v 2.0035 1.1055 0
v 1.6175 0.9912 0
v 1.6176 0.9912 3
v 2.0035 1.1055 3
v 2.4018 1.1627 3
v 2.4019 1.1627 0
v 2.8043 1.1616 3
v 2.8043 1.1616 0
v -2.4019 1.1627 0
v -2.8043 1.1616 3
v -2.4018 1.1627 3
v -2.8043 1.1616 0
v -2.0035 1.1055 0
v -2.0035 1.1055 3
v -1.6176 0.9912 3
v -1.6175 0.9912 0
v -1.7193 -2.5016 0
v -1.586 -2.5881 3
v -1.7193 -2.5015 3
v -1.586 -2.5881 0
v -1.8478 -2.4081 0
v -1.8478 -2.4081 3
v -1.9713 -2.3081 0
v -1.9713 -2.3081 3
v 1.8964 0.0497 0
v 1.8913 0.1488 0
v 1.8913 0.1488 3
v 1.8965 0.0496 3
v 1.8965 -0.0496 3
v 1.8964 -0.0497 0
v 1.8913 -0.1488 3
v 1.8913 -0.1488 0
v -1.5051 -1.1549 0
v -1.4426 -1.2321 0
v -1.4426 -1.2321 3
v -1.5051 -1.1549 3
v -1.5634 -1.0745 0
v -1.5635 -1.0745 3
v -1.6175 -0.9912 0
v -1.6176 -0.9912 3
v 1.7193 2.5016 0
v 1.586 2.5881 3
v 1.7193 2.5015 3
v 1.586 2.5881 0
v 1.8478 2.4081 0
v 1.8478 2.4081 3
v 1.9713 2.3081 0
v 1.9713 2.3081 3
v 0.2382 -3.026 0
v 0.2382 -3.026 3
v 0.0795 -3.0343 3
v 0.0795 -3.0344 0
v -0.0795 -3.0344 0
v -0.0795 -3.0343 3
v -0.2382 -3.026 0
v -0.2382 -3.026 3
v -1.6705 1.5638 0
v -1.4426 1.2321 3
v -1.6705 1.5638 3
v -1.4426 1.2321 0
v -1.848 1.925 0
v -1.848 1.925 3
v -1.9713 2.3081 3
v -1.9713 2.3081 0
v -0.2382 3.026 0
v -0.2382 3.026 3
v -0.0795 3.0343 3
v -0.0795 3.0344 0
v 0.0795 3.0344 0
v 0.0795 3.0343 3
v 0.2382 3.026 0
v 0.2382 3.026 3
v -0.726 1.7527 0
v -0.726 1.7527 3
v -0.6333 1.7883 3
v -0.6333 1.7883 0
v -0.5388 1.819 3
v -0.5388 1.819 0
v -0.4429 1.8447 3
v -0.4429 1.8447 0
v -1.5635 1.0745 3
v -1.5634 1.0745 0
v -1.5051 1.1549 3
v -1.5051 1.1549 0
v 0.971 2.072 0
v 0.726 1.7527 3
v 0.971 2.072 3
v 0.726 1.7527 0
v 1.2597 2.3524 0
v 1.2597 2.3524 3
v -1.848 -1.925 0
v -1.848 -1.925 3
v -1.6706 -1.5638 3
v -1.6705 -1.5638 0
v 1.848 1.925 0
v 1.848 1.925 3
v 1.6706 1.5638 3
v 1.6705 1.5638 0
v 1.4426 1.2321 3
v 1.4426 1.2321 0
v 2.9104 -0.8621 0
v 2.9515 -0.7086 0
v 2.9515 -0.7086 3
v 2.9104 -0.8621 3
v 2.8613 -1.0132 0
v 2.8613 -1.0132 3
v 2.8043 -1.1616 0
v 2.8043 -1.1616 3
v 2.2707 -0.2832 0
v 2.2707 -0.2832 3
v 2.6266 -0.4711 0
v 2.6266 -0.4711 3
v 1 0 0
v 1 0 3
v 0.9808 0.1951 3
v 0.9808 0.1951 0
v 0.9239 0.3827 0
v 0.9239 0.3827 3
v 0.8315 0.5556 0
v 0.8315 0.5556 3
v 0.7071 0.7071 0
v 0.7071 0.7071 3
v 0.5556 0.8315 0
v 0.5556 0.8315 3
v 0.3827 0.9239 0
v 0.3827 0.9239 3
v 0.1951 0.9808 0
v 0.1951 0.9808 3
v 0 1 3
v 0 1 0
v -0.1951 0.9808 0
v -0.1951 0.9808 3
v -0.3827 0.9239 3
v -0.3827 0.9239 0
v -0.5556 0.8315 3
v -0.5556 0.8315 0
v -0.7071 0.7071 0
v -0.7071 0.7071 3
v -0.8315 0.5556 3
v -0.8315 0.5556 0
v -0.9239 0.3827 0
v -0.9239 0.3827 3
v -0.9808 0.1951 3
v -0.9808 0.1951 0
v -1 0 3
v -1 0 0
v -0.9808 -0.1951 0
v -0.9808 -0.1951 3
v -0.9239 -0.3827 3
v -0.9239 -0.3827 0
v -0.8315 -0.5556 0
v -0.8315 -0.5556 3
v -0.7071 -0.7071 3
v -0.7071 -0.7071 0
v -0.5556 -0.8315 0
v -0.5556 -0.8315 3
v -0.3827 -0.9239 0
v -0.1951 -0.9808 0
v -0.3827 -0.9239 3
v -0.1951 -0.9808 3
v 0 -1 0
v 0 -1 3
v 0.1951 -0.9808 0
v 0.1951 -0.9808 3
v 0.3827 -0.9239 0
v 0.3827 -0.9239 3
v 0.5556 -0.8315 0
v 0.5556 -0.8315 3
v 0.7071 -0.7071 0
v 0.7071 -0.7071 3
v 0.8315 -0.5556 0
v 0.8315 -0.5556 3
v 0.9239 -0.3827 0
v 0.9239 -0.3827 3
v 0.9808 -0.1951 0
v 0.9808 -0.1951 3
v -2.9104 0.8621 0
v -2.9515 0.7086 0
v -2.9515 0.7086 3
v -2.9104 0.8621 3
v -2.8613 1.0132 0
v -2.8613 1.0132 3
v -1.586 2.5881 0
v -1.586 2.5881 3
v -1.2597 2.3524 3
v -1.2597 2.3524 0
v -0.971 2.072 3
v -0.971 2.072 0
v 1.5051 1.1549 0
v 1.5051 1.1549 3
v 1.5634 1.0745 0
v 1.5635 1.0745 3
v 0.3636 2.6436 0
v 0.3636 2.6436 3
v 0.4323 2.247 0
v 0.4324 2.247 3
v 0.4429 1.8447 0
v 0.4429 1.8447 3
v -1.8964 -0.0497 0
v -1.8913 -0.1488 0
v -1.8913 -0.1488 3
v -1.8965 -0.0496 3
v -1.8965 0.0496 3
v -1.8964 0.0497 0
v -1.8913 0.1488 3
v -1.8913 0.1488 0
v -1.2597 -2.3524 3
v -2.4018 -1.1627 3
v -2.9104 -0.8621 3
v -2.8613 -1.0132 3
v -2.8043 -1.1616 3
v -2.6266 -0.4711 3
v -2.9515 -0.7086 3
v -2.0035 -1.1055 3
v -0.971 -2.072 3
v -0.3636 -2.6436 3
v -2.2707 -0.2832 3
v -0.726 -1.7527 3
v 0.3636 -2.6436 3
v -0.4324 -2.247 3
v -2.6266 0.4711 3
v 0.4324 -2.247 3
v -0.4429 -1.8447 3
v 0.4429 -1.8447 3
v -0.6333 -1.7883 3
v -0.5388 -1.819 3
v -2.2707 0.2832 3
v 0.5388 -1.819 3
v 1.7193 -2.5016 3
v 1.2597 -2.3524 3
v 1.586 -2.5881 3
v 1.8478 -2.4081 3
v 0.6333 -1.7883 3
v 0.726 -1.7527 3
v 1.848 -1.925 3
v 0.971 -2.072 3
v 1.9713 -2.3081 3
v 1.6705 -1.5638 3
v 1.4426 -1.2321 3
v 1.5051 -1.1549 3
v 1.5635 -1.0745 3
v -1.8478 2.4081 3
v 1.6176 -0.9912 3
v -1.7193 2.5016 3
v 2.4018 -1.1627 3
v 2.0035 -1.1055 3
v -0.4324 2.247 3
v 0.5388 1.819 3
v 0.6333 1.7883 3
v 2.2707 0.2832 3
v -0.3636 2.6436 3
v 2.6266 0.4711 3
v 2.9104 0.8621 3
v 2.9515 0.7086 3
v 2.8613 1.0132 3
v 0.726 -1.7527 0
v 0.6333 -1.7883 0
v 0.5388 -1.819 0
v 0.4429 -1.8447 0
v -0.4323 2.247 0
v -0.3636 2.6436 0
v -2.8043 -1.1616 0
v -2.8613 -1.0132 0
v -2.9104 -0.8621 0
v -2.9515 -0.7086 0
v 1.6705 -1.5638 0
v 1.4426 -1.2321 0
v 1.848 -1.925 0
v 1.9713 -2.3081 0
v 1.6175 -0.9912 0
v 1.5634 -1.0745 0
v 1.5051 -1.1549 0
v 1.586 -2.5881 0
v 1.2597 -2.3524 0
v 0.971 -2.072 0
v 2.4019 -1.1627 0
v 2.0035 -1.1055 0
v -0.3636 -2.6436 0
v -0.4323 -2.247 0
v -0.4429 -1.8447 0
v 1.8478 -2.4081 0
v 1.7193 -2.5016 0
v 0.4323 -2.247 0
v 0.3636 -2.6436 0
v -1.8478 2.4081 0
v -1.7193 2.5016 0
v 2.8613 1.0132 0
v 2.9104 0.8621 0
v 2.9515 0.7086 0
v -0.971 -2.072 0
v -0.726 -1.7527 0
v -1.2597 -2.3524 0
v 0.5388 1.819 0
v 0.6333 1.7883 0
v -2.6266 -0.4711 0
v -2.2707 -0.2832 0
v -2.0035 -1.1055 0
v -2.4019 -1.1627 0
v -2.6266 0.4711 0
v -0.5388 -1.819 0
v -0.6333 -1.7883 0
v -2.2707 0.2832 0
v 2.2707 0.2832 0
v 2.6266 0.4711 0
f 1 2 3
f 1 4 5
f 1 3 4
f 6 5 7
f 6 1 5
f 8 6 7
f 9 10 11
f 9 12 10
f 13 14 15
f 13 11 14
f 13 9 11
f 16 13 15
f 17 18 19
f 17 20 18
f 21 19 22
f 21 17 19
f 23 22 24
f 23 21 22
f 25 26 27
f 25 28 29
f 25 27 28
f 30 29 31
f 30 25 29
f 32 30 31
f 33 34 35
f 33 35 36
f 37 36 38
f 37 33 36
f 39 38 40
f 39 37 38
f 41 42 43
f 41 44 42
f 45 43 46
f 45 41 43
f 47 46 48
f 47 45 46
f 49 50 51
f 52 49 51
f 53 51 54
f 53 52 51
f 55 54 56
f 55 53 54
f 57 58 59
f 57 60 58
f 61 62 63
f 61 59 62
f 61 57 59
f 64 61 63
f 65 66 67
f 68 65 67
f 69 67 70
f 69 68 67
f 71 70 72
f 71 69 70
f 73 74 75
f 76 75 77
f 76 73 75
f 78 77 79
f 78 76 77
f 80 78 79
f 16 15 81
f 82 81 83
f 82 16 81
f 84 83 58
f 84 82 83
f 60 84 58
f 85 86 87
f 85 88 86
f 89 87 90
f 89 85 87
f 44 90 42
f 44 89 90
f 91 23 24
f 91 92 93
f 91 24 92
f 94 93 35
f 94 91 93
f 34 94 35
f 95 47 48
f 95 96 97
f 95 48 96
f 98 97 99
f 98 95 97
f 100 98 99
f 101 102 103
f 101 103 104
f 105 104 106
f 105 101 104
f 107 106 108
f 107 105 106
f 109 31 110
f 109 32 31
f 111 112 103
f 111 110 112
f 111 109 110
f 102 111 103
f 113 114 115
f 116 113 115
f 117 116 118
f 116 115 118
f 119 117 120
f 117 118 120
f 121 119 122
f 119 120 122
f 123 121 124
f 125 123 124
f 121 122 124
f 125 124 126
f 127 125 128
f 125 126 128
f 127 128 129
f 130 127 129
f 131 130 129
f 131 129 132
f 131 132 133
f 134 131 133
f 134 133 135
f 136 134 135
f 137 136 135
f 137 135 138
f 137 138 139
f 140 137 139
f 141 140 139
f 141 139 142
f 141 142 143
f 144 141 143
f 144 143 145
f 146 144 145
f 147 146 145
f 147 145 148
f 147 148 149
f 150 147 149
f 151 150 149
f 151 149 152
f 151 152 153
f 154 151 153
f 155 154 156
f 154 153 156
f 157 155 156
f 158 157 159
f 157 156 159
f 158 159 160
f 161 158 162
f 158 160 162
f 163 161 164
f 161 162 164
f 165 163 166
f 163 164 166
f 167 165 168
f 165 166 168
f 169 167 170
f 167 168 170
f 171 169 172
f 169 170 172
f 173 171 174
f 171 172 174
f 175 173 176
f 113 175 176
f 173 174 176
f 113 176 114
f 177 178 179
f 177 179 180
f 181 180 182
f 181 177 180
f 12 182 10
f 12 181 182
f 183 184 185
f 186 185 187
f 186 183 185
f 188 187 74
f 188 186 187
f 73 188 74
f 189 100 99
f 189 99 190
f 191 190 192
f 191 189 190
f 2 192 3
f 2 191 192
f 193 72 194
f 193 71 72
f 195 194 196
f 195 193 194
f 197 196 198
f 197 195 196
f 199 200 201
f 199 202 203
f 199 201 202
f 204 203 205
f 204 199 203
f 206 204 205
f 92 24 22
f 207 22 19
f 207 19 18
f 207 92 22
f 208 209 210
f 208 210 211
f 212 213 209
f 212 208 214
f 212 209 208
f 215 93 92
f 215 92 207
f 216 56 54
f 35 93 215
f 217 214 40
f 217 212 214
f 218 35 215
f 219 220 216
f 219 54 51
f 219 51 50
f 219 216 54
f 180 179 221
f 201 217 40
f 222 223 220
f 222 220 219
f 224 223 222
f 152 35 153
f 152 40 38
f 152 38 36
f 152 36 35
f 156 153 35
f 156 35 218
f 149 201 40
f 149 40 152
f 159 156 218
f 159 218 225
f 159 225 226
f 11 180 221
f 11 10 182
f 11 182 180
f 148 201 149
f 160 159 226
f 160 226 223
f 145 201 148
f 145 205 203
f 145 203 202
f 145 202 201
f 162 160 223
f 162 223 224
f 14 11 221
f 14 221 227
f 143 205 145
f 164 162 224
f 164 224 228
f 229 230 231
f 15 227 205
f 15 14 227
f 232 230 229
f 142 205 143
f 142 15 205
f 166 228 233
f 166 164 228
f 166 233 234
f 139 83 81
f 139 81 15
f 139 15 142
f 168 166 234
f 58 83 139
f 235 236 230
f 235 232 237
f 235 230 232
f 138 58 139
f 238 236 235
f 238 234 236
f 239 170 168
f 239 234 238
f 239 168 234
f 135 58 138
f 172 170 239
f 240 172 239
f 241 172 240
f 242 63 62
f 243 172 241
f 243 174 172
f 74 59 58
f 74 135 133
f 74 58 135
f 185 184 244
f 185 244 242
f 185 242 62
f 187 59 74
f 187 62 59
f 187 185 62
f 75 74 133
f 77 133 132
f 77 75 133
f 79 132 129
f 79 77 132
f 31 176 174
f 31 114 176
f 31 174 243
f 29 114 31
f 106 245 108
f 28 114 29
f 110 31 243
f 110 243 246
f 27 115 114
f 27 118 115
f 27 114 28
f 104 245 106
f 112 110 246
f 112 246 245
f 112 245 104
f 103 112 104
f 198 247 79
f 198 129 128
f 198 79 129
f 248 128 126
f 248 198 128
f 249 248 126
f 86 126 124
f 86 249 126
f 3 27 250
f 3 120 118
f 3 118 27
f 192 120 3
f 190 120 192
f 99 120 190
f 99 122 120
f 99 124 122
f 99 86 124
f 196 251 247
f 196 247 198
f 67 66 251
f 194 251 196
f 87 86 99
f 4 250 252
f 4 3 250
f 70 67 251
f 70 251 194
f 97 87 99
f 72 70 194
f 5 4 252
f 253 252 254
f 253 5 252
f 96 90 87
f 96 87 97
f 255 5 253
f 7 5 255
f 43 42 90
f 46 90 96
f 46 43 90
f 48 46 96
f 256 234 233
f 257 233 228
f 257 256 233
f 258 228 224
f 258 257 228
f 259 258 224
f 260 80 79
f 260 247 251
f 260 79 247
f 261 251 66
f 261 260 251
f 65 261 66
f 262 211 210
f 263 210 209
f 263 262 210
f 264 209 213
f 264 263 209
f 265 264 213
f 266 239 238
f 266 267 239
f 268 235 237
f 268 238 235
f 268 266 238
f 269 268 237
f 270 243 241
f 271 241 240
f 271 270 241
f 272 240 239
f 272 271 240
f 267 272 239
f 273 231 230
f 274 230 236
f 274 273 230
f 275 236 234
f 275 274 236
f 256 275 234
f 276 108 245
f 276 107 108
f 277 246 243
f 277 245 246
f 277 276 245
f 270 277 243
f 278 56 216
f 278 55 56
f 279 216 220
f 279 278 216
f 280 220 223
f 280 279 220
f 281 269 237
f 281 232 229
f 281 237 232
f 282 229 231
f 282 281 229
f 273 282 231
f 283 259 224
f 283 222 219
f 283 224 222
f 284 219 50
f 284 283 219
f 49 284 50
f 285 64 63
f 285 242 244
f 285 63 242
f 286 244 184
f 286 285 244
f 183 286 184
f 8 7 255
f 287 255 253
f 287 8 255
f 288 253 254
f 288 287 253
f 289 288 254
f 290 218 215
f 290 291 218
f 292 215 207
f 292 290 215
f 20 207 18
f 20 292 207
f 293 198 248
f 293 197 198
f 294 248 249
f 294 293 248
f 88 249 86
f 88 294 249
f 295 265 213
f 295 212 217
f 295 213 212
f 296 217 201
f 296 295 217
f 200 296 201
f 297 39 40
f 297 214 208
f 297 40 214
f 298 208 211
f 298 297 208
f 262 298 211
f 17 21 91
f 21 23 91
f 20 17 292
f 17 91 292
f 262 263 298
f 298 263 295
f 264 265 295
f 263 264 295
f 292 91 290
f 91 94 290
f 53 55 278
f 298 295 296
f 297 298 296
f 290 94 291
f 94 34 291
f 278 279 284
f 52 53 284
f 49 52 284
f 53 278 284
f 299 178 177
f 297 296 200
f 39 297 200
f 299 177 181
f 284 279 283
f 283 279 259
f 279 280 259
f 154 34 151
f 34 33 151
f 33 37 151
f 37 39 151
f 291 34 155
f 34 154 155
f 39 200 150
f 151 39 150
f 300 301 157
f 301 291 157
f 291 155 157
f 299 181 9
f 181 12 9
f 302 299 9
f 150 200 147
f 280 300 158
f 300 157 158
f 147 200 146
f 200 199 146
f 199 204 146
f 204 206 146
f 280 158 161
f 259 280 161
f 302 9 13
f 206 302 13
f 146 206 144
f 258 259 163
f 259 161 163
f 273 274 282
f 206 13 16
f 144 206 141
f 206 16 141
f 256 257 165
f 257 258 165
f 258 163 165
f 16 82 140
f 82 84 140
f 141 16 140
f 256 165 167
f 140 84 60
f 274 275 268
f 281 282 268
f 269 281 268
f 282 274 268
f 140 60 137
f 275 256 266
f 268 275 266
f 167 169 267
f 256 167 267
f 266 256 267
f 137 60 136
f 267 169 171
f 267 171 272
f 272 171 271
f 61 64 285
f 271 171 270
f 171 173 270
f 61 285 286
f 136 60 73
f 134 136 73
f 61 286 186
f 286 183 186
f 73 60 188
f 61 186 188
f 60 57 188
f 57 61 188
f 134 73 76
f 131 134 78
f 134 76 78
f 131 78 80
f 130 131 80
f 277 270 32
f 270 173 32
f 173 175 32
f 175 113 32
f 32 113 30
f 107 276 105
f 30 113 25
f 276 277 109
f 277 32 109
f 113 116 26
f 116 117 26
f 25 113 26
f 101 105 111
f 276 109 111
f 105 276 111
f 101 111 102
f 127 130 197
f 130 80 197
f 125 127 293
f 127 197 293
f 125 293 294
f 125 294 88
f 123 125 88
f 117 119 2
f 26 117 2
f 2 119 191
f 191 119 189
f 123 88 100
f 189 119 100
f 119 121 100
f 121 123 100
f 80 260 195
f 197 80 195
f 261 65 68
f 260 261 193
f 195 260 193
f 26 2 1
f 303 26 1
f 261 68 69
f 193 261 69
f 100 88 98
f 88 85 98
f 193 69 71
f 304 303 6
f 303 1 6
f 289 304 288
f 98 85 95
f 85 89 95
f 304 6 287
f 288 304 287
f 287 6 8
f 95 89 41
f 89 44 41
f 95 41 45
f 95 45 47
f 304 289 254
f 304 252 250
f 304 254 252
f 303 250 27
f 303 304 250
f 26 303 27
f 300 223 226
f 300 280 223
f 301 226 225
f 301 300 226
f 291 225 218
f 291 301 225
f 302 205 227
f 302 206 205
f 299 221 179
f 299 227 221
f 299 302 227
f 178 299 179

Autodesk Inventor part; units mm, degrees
sketch "Sketch1" plane through (0, 0, 0) normal (0, 0, 1) x (1, 0, 0)
  circle A0 centre (0, 0) radius 3.0354
  dimension "d0" = 6.0708
extrude "Extrusion1" add sketch "Sketch1" along normal blind 20
ref_plane "Work Plane2" through (0, 0, 10) normal (0, 0, 1) x (1, 0, 0)
sketch "Sketch2" plane through (0, 0, 0) normal (0, 0, -1) x (-1, 0, 0)
  circle A0 centre (0, 0) radius 3.0354 projected
  circle A1 centre (0, 0) radius 2.5295
  dimension "d3" = 5.059
surface extrude "Pitch Diameter" sketch "Sketch2" against normal through all shown no curves A1
ref_plane "Work Plane8" through (0, 0, 0) normal (0.9510565, 0.309017, 0) x (0, 0, 1)
ref_plane "Work Plane9" through (0, 0, 0) normal (1, 0, 0) x (0, 1, 0)
spur gear teeth "Spur Gear" teeth 10 pitch diameter 5.059 tip diameter 6.0708 root diameter 3.7942 face width 20 start plane through (0, 0, 0) normal (0, 0, -1) x (-1, 0, 0)
sketch "Sketch3" plane through (0, 0, 20) normal (0, 0, 1) x (1, 0, 0)
  arc A0 (-1.9713, 2.3081) -> (-1.4426, 1.2321) centre (0.7208, 2.9631) ccw projected
  arc A1 (-1.4426, 1.2321) -> (-1.6176, 0.9912) centre (0, 0) ccw projected
  arc A2 (-1.6176, 0.9912) -> (-2.8043, 1.1616) centre (-2.5953, -1.6011) ccw projected
  arc A3 (-2.8043, 1.1616) -> (-2.9515, 0.7086) centre (0, 0) ccw projected
  arc A4 (-2.9515, 0.7086) -> (-1.8913, 0.1488) centre (-1.1585, 2.8208) ccw projected
  arc A5 (-1.8913, 0.1488) -> (-1.8913, -0.1488) centre (0, 0) ccw projected
  arc A6 (-1.8913, -0.1488) -> (-2.9515, -0.7086) centre (-1.1585, -2.8208) ccw projected
  arc A7 (-2.9515, -0.7086) -> (-2.8043, -1.1616) centre (0, 0) ccw projected
  arc A8 (-2.8043, -1.1616) -> (-1.6176, -0.9912) centre (-2.5953, 1.6011) ccw projected
  arc A9 (-1.6176, -0.9912) -> (-1.4426, -1.2321) centre (0, 0) ccw projected
  arc A10 (-1.4426, -1.2321) -> (-1.9713, -2.3081) centre (0.7208, -2.9631) ccw projected
  arc A11 (-1.9713, -2.3081) -> (-1.586, -2.5881) centre (0, 0) ccw projected
  arc A12 (-1.586, -2.5881) -> (-0.726, -1.7527) centre (-3.0408, -0.2301) ccw projected
  arc A13 (-0.726, -1.7527) -> (-0.4429, -1.8447) centre (0, 0) ccw projected
  arc A14 (-0.4429, -1.8447) -> (-0.2382, -3.026) centre (2.3248, -1.9735) ccw projected
  arc A15 (-0.2382, -3.026) -> (0.2382, -3.026) centre (0, 0) ccw projected
  arc A16 (0.2382, -3.026) -> (0.4429, -1.8447) centre (-2.3248, -1.9735) ccw projected
  arc A17 (0.4429, -1.8447) -> (0.726, -1.7527) centre (0, 0) ccw projected
  arc A18 (0.726, -1.7527) -> (1.586, -2.5881) centre (3.0408, -0.2301) ccw projected
  arc A19 (1.586, -2.5881) -> (1.9713, -2.3081) centre (0, 0) ccw projected
  arc A20 (1.9713, -2.3081) -> (1.4426, -1.2321) centre (-0.7208, -2.9631) ccw projected
  arc A21 (1.4426, -1.2321) -> (1.6176, -0.9912) centre (0, 0) ccw projected
  arc A22 (1.6176, -0.9912) -> (2.8043, -1.1616) centre (2.5953, 1.6011) ccw projected
  arc A23 (2.8043, -1.1616) -> (2.9515, -0.7086) centre (0, 0) ccw projected
  arc A24 (2.9515, -0.7086) -> (1.8913, -0.1488) centre (1.1585, -2.8208) ccw projected
  arc A25 (1.8913, -0.1488) -> (1.8913, 0.1488) centre (0, 0) ccw projected
  arc A26 (1.8913, 0.1488) -> (2.9515, 0.7086) centre (1.1585, 2.8208) ccw projected
  arc A27 (2.9515, 0.7086) -> (2.8043, 1.1616) centre (0, 0) ccw projected
  arc A28 (2.8043, 1.1616) -> (1.6176, 0.9912) centre (2.5953, -1.6011) ccw projected
  arc A29 (1.6176, 0.9912) -> (1.4426, 1.2321) centre (0, 0) ccw projected
  arc A30 (1.4426, 1.2321) -> (1.9713, 2.3081) centre (-0.7208, 2.9631) ccw projected
  arc A31 (1.9713, 2.3081) -> (1.586, 2.5881) centre (0, 0) ccw projected
  arc A32 (1.586, 2.5881) -> (0.726, 1.7527) centre (3.0408, 0.2301) ccw projected
  arc A33 (0.726, 1.7527) -> (0.4429, 1.8447) centre (0, 0) ccw projected
  arc A34 (0.4429, 1.8447) -> (0.2382, 3.026) centre (-2.3248, 1.9735) ccw projected
  arc A35 (0.2382, 3.026) -> (-0.2382, 3.026) centre (0, 0) ccw projected
  arc A36 (-0.2382, 3.026) -> (-0.4429, 1.8447) centre (2.3248, 1.9735) ccw projected
  arc A37 (-0.4429, 1.8447) -> (-0.726, 1.7527) centre (0, 0) ccw projected
  arc A38 (-0.726, 1.7527) -> (-1.586, 2.5881) centre (-3.0408, 0.2301) ccw projected
  arc A39 (-1.586, 2.5881) -> (-1.9713, 2.3081) centre (0, 0) ccw projected
  circle A40 centre (0, 0) radius 1
  dimension "d49" = 2
ref_plane "Work Plane11" through (-4.7906, 1.2372, 4) normal (0, 0, 1) x (0.9749279, -0.2225209, 0)
extrude "Extrusion2" cut sketch "Sketch3" against normal up to surface (16 mm away) contours A39 A38 A37 A36 A35 A34 A33 A32 A31 A30 A29 A28 A27 A26 A25 A24 A23 A22 A21 A20 A19 A18 A17 A16 A15 A14 A13 A12 A11 A10 A9 A8 A7 A6 A5 A4 A3 A2 A1 A0 | A40
extrude "Extrusion3" cut sketch "Sketch3" against normal through all contours A40
sketch "Sketch4" plane through (0, 0, 4) normal (0, 0, 1) x (1, 0, 0)
  circle A0 centre (0, 0) radius 1 projected
  arc A1 (-1.6176, 0.9912) -> (-2.8043, 1.1616) centre (-2.5953, -1.6011) ccw projected
  arc A2 (-2.8043, 1.1616) -> (-2.9515, 0.7086) centre (0, 0) ccw projected
  arc A3 (-2.9515, 0.7086) -> (-1.8913, 0.1488) centre (-1.1585, 2.8208) ccw projected
  arc A4 (-1.8913, 0.1488) -> (-1.8913, -0.1488) centre (0, 0) ccw projected
  arc A5 (-1.8913, -0.1488) -> (-2.9515, -0.7086) centre (-1.1585, -2.8208) ccw projected
  arc A6 (-2.9515, -0.7086) -> (-2.8043, -1.1616) centre (0, 0) ccw projected
  arc A7 (-2.8043, -1.1616) -> (-1.6176, -0.9912) centre (-2.5953, 1.6011) ccw projected
  arc A8 (-1.6176, -0.9912) -> (-1.4426, -1.2321) centre (0, 0) ccw projected
  arc A9 (-1.4426, -1.2321) -> (-1.9713, -2.3081) centre (0.7208, -2.9631) ccw projected
  arc A10 (-1.9713, -2.3081) -> (-1.586, -2.5881) centre (0, 0) ccw projected
  arc A11 (-1.586, -2.5881) -> (-0.726, -1.7527) centre (-3.0408, -0.2301) ccw projected
  arc A12 (-0.726, -1.7527) -> (-0.4429, -1.8447) centre (0, 0) ccw projected
  arc A13 (-0.4429, -1.8447) -> (-0.2382, -3.026) centre (2.3248, -1.9735) ccw projected
  arc A14 (-0.2382, -3.026) -> (0.2382, -3.026) centre (0, 0) ccw projected
  arc A15 (0.2382, -3.026) -> (0.4429, -1.8447) centre (-2.3248, -1.9735) ccw projected
  arc A16 (0.4429, -1.8447) -> (0.726, -1.7527) centre (0, 0) ccw projected
  arc A17 (0.726, -1.7527) -> (1.586, -2.5881) centre (3.0408, -0.2301) ccw projected
  arc A18 (1.586, -2.5881) -> (1.9713, -2.3081) centre (0, 0) ccw projected
  arc A19 (1.9713, -2.3081) -> (1.4426, -1.2321) centre (-0.7208, -2.9631) ccw projected
  arc A20 (1.4426, -1.2321) -> (1.6176, -0.9912) centre (0, 0) ccw projected
  arc A21 (1.6176, -0.9912) -> (2.8043, -1.1616) centre (2.5953, 1.6011) ccw projected
  arc A22 (2.8043, -1.1616) -> (2.9515, -0.7086) centre (0, 0) ccw projected
  arc A23 (2.9515, -0.7086) -> (1.8913, -0.1488) centre (1.1585, -2.8208) ccw projected
  arc A24 (1.8913, -0.1488) -> (1.8913, 0.1488) centre (0, 0) ccw projected
  arc A25 (1.8913, 0.1488) -> (2.9515, 0.7086) centre (1.1585, 2.8208) ccw projected
  arc A26 (2.9515, 0.7086) -> (2.8043, 1.1616) centre (0, 0) ccw projected
  arc A27 (2.8043, 1.1616) -> (1.6176, 0.9912) centre (2.5953, -1.6011) ccw projected
  arc A28 (1.6176, 0.9912) -> (1.4426, 1.2321) centre (0, 0) ccw projected
  arc A29 (1.4426, 1.2321) -> (1.9713, 2.3081) centre (-0.7208, 2.9631) ccw projected
  arc A30 (1.9713, 2.3081) -> (1.586, 2.5881) centre (0, 0) ccw projected
  arc A31 (1.586, 2.5881) -> (0.726, 1.7527) centre (3.0408, 0.2301) ccw projected
  arc A32 (0.726, 1.7527) -> (0.4429, 1.8447) centre (0, 0) ccw projected
  arc A33 (0.4429, 1.8447) -> (0.2382, 3.026) centre (-2.3248, 1.9735) ccw projected
  arc A34 (0.2382, 3.026) -> (-0.2382, 3.026) centre (0, 0) ccw projected
  arc A35 (-0.2382, 3.026) -> (-0.4429, 1.8447) centre (2.3248, 1.9735) ccw projected
  arc A36 (-0.4429, 1.8447) -> (-0.726, 1.7527) centre (0, 0) ccw projected
  arc A37 (-0.726, 1.7527) -> (-1.586, 2.5881) centre (-3.0408, 0.2301) ccw projected
  arc A38 (-1.586, 2.5881) -> (-1.9713, 2.3081) centre (0, 0) ccw projected
  arc A39 (-1.9713, 2.3081) -> (-1.4426, 1.2321) centre (0.7208, 2.9631) ccw projected
  arc A40 (-1.4426, 1.2321) -> (-1.6176, 0.9912) centre (0, 0) ccw projected
extrude "Extrusion4" cut sketch "Sketch4" against normal blind 1
equation "\"d0\" = da_da"
equation "\"d1\" = da_b"
equation "\"d3\" = da_d"
equation "\"d16\" = da_aw"
equation "\"d43\" = da_aw"
equation "\"d46\" = da_aw"
equation "\"da_da\" = 6.0708"
equation "\"da_b\" = 20"
equation "\"da_d\" = 5.059"
equation "\"da_aw\" = 6.0708"
properties part number "Spur Gear1" material "Steel"
